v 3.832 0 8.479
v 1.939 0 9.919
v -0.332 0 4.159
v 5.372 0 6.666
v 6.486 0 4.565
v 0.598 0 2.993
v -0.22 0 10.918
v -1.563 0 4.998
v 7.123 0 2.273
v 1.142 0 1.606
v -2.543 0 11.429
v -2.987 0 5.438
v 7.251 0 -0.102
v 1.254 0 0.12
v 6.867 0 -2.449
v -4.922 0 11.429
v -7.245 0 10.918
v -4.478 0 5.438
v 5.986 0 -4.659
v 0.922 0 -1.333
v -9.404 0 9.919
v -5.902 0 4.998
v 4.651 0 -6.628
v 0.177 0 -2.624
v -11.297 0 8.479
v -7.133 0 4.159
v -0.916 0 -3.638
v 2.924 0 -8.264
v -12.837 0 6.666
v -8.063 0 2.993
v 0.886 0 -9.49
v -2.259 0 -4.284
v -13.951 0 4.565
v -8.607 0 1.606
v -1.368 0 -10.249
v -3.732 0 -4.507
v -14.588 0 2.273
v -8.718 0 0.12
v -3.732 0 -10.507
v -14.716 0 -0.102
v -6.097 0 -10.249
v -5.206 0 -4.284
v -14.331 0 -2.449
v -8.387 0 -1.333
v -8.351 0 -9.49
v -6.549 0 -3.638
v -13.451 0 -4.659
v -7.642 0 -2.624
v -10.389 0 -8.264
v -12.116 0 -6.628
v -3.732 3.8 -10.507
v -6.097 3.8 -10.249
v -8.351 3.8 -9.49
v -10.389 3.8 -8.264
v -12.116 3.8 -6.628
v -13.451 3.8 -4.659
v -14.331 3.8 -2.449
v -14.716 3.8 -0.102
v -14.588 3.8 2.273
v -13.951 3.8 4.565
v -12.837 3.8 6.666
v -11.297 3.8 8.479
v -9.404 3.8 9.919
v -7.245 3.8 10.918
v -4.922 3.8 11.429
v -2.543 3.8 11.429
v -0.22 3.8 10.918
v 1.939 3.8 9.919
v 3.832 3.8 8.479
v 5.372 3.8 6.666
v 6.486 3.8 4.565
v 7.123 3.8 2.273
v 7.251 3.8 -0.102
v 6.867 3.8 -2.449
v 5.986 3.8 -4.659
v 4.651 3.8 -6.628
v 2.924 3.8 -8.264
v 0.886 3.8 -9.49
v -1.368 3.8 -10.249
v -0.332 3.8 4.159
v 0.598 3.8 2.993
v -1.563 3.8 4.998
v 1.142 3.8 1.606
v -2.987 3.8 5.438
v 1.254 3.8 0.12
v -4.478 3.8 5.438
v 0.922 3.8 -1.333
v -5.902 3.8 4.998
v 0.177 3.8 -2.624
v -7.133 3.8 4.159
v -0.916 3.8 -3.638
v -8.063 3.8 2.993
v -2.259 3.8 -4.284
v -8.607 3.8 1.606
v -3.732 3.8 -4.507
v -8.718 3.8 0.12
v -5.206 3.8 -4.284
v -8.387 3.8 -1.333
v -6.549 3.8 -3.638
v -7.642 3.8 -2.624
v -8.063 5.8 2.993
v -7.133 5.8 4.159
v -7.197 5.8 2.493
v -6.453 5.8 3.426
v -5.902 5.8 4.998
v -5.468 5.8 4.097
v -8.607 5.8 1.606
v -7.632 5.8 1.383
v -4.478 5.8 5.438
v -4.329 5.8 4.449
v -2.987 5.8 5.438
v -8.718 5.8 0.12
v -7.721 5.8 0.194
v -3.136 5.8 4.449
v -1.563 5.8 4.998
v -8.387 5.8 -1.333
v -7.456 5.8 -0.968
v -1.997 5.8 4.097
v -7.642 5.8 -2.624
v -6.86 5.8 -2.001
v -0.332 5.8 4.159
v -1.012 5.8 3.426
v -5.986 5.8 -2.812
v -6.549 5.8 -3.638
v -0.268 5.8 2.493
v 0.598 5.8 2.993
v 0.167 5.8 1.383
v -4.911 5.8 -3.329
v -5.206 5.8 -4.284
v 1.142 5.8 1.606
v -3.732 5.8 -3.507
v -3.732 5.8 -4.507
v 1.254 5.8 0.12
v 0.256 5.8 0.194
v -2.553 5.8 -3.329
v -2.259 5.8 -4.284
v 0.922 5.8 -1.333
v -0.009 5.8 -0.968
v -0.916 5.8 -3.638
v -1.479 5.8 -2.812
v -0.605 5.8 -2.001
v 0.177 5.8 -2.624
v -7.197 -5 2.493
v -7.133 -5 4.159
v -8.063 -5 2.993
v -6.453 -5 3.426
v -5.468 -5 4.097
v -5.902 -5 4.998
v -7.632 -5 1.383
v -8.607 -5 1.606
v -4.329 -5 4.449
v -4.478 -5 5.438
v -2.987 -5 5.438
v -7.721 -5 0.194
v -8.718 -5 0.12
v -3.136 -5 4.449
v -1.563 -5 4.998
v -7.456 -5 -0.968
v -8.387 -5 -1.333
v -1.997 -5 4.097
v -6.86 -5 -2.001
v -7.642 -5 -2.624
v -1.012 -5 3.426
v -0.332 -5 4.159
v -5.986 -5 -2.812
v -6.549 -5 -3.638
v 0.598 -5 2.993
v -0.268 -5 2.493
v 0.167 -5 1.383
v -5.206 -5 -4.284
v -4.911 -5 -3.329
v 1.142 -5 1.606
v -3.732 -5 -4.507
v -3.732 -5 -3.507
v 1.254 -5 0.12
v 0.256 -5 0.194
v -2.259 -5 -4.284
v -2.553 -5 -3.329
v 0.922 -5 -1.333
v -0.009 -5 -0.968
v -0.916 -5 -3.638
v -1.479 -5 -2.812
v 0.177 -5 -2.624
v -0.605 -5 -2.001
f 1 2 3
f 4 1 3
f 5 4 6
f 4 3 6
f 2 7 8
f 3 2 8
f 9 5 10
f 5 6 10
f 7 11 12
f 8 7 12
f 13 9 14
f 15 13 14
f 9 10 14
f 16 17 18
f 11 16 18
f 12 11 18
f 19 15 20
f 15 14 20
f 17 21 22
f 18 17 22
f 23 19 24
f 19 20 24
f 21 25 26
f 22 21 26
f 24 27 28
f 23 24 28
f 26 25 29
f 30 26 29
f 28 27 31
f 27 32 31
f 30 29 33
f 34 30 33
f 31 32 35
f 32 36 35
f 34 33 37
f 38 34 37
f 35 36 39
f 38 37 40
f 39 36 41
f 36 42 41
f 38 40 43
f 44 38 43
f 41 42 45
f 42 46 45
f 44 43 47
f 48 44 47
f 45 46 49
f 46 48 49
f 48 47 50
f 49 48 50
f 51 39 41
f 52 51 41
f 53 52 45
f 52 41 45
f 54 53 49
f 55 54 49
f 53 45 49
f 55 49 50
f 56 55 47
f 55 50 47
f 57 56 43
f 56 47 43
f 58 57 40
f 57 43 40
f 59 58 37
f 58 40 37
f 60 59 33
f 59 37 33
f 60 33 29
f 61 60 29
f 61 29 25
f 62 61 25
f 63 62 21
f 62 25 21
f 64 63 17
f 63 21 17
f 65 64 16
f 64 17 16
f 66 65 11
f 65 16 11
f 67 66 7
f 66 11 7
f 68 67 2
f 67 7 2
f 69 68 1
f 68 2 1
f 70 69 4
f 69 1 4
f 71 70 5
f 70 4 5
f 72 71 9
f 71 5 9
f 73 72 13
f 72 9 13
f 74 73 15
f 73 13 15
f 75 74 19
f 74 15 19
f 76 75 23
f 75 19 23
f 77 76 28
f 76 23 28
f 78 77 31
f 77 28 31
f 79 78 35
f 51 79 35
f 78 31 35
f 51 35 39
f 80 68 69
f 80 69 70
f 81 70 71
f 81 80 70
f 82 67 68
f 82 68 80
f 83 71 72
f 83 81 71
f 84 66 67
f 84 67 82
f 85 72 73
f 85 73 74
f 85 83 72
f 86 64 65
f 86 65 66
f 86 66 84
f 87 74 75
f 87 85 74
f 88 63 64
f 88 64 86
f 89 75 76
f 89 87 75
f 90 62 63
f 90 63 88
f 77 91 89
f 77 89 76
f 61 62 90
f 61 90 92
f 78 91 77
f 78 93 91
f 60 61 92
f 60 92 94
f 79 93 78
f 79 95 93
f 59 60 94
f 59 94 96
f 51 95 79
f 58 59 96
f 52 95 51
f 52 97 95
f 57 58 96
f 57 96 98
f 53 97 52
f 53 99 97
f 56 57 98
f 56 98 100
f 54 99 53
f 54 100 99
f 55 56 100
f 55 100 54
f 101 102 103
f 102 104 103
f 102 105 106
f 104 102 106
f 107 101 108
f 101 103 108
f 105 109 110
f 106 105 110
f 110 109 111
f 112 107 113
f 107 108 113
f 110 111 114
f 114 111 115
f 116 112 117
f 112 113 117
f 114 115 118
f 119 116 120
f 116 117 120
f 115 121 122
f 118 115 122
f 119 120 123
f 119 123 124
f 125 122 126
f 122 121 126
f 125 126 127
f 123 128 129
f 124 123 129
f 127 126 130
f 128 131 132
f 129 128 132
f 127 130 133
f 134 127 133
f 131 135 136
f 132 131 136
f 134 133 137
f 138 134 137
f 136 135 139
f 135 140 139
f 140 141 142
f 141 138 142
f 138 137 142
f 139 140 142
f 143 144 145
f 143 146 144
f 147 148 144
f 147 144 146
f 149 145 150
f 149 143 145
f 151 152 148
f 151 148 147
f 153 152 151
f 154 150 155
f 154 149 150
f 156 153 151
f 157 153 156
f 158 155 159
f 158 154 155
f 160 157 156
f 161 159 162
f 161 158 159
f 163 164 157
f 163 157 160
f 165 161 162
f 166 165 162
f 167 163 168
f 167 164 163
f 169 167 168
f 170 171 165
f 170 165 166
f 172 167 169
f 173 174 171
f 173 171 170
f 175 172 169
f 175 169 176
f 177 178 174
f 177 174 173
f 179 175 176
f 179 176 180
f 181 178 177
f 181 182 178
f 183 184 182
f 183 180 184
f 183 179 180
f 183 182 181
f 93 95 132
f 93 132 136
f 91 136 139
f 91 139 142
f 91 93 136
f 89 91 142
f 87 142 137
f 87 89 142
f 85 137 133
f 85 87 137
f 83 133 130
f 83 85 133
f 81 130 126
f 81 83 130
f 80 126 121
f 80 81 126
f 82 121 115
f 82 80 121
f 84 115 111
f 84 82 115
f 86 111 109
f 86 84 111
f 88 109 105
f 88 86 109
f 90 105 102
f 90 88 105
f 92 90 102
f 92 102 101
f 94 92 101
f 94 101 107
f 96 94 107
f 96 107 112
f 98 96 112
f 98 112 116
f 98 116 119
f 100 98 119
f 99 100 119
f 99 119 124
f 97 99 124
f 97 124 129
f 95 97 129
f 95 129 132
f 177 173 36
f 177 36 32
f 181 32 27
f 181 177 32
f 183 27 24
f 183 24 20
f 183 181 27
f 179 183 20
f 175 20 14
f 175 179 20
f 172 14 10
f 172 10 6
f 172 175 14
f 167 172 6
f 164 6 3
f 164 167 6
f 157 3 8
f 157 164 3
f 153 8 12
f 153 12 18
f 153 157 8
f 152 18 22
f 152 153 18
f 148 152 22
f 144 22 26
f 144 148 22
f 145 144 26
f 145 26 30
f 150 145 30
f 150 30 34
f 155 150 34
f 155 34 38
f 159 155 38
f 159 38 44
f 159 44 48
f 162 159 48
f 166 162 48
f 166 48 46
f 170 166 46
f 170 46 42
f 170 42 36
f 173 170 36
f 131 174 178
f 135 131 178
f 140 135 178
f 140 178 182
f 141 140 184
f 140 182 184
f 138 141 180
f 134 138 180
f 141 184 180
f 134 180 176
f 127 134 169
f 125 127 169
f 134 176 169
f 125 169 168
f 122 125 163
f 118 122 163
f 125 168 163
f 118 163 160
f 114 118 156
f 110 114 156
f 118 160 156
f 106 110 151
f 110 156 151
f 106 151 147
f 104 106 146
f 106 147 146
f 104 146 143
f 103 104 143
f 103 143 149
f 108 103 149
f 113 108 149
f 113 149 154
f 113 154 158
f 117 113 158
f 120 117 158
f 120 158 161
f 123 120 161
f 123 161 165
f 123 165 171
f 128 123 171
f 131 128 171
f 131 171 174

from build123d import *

# Parameters (mm, degrees)
SKETCH1_R           = 11
SKETCH1_R_2         = 4
BOSS_EXTRUDE1_DEPTH = 3.8
SKETCH2_R           = 5
SKETCH2_R_2         = 4
BOSS_EXTRUDE2_DEPTH = 10.8


with BuildPart() as part:
    # Sketch1 → Boss-Extrude1 (new body)
    with BuildSketch(Plane(origin=(0, 0, 0), x_dir=(1, 0, 0), z_dir=(0, 1, 0))):
        with Locations(Location((-3.732448162, -0.493369585, 0), (0, 0, 90))):
            Circle(SKETCH1_R)
        with Locations(Location((-3.732448162, -0.493369585, 0), (0, 0, 90))):
            Circle(SKETCH1_R_2, mode=Mode.SUBTRACT)
    extrude(amount=BOSS_EXTRUDE1_DEPTH)

    # Sketch2 → Boss-Extrude2 (add)
    with BuildSketch(Plane(origin=(0, -4.999999906, 0), x_dir=(-1, 0, 0), z_dir=(0, -1, 0))):
        with Locations(Location((3.732448162, -0.493369585, 0), (0, 0, 90))):
            Circle(SKETCH2_R)
        with Locations(Location((3.732448162, -0.493369585, 0), (0, 0, 90))):
            Circle(SKETCH2_R_2, mode=Mode.SUBTRACT)
    extrude(amount=-BOSS_EXTRUDE2_DEPTH)


solid = part.part
